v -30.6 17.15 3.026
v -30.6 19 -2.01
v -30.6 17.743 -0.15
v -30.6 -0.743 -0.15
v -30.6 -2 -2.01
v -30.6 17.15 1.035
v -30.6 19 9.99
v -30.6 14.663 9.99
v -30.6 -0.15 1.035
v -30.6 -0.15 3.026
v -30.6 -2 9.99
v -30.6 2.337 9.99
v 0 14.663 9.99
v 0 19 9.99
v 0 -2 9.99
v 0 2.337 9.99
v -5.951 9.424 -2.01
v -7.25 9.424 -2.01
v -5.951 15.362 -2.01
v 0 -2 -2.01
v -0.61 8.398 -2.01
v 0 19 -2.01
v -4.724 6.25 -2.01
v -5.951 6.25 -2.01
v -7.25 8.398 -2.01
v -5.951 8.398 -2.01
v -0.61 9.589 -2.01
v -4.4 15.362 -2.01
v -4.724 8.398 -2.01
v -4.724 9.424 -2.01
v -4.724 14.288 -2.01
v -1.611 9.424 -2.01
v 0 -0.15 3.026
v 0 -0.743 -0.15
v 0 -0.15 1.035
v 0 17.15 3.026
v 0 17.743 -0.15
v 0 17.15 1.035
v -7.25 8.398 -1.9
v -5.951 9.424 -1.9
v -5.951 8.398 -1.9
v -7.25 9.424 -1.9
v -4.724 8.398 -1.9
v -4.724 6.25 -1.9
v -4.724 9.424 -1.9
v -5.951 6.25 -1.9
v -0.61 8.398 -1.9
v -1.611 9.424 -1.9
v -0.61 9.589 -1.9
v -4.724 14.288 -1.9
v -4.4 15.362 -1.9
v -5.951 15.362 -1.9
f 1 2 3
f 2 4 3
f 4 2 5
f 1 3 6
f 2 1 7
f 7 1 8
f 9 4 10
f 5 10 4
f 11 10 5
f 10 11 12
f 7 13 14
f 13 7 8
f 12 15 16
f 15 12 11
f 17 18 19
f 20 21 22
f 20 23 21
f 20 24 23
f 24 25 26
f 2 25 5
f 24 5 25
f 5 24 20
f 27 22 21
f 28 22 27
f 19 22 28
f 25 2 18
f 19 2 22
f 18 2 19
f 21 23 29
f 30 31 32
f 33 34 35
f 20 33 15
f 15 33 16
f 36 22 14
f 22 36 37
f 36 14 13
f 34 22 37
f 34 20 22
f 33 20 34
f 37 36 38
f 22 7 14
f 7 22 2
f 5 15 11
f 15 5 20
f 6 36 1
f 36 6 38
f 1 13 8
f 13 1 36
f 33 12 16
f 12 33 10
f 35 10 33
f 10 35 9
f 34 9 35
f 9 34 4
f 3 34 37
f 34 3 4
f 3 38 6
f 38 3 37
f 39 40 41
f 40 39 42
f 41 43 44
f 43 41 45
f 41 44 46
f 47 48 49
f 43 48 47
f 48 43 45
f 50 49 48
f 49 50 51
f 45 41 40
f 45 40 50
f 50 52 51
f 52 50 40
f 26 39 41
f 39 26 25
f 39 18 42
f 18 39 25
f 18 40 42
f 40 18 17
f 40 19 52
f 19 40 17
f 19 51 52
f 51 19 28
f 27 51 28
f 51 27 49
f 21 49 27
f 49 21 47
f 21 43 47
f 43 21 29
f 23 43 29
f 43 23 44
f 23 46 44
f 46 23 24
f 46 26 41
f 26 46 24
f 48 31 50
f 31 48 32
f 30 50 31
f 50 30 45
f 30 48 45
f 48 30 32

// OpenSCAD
char="W";
piece="holder";
size=4; // size of holder

e=0.01;

bottom_x=17;
top_x=12;
y=10;

font_size=9;
letter_width=7.5;

dx=(bottom_x-top_x)/2;

if (piece == "letter") {
    mirror([1, 0, 0])
    union() {
        difference() {
            // base
            rotate([90, 0, 90])
            linear_extrude(letter_width)
            cross_section();
            
            // notch
            translate([letter_width-1+e, 0, y-1+e])
            cube([1, dx+1, 1]);
        }
        
        letter_on_top(char);
        
        // Use this to test how letters fit
    //    all_letters_on_top();
    }
}

if (piece == "holder") {
    holder(letters=size);
}


module cross_section() {
    bottom=3;
    
    polygon([[0, 0], [bottom_x, 0], [bottom_x, bottom], [bottom_x-dx, y], [dx, y], [0, bottom]]);
}

module elephant_foot() {
    polygon([[-0.5, 0], [bottom_x+0.5, 0], [bottom_x, 1], [0, 1]]);
}

module letter_on_top(ch = "W") {
    // Font: Tlwg Typist
    // Copyright (C) 2003, 2004 Poonlap Veerathanabutr <poonlap@linux.thai.net>
    translate([0, bottom_x/2-font_size/4, y-e])
    linear_extrude(2)
    text(ch, font="Tlwg Typist", size=font_size, halign="left", valign="baseline");
}

module all_letters_on_top() {
    for (ch = [ord("a"):1:ord("z")]) {
        letter_on_top(chr(ch));
    }
    for (ch = [ord("A"):1:ord("Z")]) {
        letter_on_top(chr(ch));
    }
    for (ch = [ord("0"):1:ord("9")]) {
        letter_on_top(chr(ch));
    }
}

module holder(letters=10) {
    mirror([1, 0, 0])
    difference() {
        translate([0, -2, -2-e])
        cube([(letter_width+0.15) * letters, bottom_x + 4, y + 2]);
        
        translate([-500, 0, 0])
        rotate([90, 0, 90])
        linear_extrude(1000)
        offset(delta=0.15)
        union() {
            elephant_foot();
            cross_section();
        }
        
        translate([0, bottom_x/2-font_size/4, -4+0.1])
        linear_extrude(2)
        text(str(letters), font="Tlwg Typist", size=font_size, halign="left", valign="baseline");
    }
}
